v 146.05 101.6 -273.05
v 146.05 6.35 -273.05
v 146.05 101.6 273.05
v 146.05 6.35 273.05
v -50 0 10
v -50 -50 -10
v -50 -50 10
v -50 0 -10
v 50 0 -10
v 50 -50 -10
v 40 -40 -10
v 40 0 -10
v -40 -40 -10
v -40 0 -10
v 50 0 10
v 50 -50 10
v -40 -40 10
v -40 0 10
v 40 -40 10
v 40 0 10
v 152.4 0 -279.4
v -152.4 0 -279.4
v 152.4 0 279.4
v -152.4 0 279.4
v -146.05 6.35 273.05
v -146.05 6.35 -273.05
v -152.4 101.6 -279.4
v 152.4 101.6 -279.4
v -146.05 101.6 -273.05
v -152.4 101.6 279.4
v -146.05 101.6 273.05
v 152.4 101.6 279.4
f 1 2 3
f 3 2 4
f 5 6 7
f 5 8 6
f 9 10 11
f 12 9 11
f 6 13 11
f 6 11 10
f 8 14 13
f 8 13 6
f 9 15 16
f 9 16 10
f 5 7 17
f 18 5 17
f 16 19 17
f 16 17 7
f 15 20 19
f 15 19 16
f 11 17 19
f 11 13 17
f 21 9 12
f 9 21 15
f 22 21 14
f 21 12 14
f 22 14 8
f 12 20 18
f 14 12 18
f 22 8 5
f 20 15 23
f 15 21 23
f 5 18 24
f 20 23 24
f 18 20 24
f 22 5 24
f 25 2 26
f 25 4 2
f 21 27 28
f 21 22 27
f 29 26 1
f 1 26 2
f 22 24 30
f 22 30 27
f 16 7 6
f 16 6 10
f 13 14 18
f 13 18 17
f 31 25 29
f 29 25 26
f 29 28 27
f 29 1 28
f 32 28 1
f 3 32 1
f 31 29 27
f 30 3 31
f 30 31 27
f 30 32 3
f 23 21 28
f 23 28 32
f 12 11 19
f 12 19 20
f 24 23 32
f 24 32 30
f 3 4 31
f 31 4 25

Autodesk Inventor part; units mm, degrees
ref_plane "YZ Plane" through (0, 0, 0) normal (1, 0, 0) x (0, 1, 0)
ref_plane "XZ Plane" through (0, 0, 0) normal (0, 1, 0) x (-1, 0, 0)
ref_plane "XY Plane" through (0, 0, 0) normal (0, 0, 1) x (1, 0, 0)
sketch "Sketch1" plane through (0, 0, 0) normal (0, 1, 0) x (-1, 0, 0)
  line L0 (-152.4, 279.4) -> (152.4, 279.4)
  line L1 (152.4, 279.4) -> (152.4, -279.4)
  line L2 (152.4, -279.4) -> (-152.4, -279.4)
  line L3 (-152.4, -279.4) -> (-152.4, 279.4)
  line L4 (-152.4, 279.4) -> (152.4, -279.4) construction
  line L5 (152.4, 279.4) -> (-152.4, -279.4) construction
  line L6 (-146.05, 273.05) -> (146.05, 273.05)
  line L7 (146.05, 273.05) -> (146.05, -273.05)
  line L8 (146.05, -273.05) -> (-146.05, -273.05)
  line L9 (-146.05, -273.05) -> (-146.05, 273.05)
  line L10 (-146.05, 273.05) -> (146.05, -273.05) construction
  line L11 (146.05, 273.05) -> (-146.05, -273.05) construction
  point P0 (0, 0)
  dimension "d0" = 558.8
  dimension "d1" = 304.8
  dimension "d2" = 546.1
  dimension "d3" = 292.1
extrude "Extrusion1" add sketch "Sketch1" along normal blind 6.35 contours L6 L7 L8 L9
extrude "Extrusion2" add sketch "Sketch1" along normal blind 101.6
sketch "Sketch2" plane through (0, 0, 0) normal (0, -1, 0) x (1, 0, 0)
  line L0 (-50, 10) -> (50, 10)
  line L1 (50, 10) -> (50, -10)
  line L2 (50, -10) -> (-50, -10)
  line L3 (-50, -10) -> (-50, 10)
  line L4 (-50, 10) -> (50, -10) construction
  line L5 (50, 10) -> (-50, -10) construction
  point P0 (0, 0)
  dimension "d8" = 20
  dimension "d9" = 100
extrude "Extrusion3" add sketch "Sketch2" along normal blind 50
sketch "Sketch4" plane through (50, 0, -10) normal (0, 0, -1) x (-1, 0, 0)
  line L0 (202.4, 0) -> (-102.4, 0) projected
  line L1 (90, 0) -> (90, -40)
  line L2 (90, -40) -> (10, -40)
  line L3 (10, -40) -> (10, 0)
  line L4 (100, -50) -> (0, -50) projected
  line L5 (0, 0) -> (0, -50) projected
  line L6 (100, 0) -> (100, -50) projected
  point P0 (50, 0)
  point P1 (50, -40)
  point P2 (0, -25)
  dimension "d17" = 10
  dimension "d18" = 10
  dimension "d19" = 10
extrude "Extrusion5" cut sketch "Sketch4" against normal blind 50 contours L1 L2 L3 L0
properties part number "Blackout Box"
